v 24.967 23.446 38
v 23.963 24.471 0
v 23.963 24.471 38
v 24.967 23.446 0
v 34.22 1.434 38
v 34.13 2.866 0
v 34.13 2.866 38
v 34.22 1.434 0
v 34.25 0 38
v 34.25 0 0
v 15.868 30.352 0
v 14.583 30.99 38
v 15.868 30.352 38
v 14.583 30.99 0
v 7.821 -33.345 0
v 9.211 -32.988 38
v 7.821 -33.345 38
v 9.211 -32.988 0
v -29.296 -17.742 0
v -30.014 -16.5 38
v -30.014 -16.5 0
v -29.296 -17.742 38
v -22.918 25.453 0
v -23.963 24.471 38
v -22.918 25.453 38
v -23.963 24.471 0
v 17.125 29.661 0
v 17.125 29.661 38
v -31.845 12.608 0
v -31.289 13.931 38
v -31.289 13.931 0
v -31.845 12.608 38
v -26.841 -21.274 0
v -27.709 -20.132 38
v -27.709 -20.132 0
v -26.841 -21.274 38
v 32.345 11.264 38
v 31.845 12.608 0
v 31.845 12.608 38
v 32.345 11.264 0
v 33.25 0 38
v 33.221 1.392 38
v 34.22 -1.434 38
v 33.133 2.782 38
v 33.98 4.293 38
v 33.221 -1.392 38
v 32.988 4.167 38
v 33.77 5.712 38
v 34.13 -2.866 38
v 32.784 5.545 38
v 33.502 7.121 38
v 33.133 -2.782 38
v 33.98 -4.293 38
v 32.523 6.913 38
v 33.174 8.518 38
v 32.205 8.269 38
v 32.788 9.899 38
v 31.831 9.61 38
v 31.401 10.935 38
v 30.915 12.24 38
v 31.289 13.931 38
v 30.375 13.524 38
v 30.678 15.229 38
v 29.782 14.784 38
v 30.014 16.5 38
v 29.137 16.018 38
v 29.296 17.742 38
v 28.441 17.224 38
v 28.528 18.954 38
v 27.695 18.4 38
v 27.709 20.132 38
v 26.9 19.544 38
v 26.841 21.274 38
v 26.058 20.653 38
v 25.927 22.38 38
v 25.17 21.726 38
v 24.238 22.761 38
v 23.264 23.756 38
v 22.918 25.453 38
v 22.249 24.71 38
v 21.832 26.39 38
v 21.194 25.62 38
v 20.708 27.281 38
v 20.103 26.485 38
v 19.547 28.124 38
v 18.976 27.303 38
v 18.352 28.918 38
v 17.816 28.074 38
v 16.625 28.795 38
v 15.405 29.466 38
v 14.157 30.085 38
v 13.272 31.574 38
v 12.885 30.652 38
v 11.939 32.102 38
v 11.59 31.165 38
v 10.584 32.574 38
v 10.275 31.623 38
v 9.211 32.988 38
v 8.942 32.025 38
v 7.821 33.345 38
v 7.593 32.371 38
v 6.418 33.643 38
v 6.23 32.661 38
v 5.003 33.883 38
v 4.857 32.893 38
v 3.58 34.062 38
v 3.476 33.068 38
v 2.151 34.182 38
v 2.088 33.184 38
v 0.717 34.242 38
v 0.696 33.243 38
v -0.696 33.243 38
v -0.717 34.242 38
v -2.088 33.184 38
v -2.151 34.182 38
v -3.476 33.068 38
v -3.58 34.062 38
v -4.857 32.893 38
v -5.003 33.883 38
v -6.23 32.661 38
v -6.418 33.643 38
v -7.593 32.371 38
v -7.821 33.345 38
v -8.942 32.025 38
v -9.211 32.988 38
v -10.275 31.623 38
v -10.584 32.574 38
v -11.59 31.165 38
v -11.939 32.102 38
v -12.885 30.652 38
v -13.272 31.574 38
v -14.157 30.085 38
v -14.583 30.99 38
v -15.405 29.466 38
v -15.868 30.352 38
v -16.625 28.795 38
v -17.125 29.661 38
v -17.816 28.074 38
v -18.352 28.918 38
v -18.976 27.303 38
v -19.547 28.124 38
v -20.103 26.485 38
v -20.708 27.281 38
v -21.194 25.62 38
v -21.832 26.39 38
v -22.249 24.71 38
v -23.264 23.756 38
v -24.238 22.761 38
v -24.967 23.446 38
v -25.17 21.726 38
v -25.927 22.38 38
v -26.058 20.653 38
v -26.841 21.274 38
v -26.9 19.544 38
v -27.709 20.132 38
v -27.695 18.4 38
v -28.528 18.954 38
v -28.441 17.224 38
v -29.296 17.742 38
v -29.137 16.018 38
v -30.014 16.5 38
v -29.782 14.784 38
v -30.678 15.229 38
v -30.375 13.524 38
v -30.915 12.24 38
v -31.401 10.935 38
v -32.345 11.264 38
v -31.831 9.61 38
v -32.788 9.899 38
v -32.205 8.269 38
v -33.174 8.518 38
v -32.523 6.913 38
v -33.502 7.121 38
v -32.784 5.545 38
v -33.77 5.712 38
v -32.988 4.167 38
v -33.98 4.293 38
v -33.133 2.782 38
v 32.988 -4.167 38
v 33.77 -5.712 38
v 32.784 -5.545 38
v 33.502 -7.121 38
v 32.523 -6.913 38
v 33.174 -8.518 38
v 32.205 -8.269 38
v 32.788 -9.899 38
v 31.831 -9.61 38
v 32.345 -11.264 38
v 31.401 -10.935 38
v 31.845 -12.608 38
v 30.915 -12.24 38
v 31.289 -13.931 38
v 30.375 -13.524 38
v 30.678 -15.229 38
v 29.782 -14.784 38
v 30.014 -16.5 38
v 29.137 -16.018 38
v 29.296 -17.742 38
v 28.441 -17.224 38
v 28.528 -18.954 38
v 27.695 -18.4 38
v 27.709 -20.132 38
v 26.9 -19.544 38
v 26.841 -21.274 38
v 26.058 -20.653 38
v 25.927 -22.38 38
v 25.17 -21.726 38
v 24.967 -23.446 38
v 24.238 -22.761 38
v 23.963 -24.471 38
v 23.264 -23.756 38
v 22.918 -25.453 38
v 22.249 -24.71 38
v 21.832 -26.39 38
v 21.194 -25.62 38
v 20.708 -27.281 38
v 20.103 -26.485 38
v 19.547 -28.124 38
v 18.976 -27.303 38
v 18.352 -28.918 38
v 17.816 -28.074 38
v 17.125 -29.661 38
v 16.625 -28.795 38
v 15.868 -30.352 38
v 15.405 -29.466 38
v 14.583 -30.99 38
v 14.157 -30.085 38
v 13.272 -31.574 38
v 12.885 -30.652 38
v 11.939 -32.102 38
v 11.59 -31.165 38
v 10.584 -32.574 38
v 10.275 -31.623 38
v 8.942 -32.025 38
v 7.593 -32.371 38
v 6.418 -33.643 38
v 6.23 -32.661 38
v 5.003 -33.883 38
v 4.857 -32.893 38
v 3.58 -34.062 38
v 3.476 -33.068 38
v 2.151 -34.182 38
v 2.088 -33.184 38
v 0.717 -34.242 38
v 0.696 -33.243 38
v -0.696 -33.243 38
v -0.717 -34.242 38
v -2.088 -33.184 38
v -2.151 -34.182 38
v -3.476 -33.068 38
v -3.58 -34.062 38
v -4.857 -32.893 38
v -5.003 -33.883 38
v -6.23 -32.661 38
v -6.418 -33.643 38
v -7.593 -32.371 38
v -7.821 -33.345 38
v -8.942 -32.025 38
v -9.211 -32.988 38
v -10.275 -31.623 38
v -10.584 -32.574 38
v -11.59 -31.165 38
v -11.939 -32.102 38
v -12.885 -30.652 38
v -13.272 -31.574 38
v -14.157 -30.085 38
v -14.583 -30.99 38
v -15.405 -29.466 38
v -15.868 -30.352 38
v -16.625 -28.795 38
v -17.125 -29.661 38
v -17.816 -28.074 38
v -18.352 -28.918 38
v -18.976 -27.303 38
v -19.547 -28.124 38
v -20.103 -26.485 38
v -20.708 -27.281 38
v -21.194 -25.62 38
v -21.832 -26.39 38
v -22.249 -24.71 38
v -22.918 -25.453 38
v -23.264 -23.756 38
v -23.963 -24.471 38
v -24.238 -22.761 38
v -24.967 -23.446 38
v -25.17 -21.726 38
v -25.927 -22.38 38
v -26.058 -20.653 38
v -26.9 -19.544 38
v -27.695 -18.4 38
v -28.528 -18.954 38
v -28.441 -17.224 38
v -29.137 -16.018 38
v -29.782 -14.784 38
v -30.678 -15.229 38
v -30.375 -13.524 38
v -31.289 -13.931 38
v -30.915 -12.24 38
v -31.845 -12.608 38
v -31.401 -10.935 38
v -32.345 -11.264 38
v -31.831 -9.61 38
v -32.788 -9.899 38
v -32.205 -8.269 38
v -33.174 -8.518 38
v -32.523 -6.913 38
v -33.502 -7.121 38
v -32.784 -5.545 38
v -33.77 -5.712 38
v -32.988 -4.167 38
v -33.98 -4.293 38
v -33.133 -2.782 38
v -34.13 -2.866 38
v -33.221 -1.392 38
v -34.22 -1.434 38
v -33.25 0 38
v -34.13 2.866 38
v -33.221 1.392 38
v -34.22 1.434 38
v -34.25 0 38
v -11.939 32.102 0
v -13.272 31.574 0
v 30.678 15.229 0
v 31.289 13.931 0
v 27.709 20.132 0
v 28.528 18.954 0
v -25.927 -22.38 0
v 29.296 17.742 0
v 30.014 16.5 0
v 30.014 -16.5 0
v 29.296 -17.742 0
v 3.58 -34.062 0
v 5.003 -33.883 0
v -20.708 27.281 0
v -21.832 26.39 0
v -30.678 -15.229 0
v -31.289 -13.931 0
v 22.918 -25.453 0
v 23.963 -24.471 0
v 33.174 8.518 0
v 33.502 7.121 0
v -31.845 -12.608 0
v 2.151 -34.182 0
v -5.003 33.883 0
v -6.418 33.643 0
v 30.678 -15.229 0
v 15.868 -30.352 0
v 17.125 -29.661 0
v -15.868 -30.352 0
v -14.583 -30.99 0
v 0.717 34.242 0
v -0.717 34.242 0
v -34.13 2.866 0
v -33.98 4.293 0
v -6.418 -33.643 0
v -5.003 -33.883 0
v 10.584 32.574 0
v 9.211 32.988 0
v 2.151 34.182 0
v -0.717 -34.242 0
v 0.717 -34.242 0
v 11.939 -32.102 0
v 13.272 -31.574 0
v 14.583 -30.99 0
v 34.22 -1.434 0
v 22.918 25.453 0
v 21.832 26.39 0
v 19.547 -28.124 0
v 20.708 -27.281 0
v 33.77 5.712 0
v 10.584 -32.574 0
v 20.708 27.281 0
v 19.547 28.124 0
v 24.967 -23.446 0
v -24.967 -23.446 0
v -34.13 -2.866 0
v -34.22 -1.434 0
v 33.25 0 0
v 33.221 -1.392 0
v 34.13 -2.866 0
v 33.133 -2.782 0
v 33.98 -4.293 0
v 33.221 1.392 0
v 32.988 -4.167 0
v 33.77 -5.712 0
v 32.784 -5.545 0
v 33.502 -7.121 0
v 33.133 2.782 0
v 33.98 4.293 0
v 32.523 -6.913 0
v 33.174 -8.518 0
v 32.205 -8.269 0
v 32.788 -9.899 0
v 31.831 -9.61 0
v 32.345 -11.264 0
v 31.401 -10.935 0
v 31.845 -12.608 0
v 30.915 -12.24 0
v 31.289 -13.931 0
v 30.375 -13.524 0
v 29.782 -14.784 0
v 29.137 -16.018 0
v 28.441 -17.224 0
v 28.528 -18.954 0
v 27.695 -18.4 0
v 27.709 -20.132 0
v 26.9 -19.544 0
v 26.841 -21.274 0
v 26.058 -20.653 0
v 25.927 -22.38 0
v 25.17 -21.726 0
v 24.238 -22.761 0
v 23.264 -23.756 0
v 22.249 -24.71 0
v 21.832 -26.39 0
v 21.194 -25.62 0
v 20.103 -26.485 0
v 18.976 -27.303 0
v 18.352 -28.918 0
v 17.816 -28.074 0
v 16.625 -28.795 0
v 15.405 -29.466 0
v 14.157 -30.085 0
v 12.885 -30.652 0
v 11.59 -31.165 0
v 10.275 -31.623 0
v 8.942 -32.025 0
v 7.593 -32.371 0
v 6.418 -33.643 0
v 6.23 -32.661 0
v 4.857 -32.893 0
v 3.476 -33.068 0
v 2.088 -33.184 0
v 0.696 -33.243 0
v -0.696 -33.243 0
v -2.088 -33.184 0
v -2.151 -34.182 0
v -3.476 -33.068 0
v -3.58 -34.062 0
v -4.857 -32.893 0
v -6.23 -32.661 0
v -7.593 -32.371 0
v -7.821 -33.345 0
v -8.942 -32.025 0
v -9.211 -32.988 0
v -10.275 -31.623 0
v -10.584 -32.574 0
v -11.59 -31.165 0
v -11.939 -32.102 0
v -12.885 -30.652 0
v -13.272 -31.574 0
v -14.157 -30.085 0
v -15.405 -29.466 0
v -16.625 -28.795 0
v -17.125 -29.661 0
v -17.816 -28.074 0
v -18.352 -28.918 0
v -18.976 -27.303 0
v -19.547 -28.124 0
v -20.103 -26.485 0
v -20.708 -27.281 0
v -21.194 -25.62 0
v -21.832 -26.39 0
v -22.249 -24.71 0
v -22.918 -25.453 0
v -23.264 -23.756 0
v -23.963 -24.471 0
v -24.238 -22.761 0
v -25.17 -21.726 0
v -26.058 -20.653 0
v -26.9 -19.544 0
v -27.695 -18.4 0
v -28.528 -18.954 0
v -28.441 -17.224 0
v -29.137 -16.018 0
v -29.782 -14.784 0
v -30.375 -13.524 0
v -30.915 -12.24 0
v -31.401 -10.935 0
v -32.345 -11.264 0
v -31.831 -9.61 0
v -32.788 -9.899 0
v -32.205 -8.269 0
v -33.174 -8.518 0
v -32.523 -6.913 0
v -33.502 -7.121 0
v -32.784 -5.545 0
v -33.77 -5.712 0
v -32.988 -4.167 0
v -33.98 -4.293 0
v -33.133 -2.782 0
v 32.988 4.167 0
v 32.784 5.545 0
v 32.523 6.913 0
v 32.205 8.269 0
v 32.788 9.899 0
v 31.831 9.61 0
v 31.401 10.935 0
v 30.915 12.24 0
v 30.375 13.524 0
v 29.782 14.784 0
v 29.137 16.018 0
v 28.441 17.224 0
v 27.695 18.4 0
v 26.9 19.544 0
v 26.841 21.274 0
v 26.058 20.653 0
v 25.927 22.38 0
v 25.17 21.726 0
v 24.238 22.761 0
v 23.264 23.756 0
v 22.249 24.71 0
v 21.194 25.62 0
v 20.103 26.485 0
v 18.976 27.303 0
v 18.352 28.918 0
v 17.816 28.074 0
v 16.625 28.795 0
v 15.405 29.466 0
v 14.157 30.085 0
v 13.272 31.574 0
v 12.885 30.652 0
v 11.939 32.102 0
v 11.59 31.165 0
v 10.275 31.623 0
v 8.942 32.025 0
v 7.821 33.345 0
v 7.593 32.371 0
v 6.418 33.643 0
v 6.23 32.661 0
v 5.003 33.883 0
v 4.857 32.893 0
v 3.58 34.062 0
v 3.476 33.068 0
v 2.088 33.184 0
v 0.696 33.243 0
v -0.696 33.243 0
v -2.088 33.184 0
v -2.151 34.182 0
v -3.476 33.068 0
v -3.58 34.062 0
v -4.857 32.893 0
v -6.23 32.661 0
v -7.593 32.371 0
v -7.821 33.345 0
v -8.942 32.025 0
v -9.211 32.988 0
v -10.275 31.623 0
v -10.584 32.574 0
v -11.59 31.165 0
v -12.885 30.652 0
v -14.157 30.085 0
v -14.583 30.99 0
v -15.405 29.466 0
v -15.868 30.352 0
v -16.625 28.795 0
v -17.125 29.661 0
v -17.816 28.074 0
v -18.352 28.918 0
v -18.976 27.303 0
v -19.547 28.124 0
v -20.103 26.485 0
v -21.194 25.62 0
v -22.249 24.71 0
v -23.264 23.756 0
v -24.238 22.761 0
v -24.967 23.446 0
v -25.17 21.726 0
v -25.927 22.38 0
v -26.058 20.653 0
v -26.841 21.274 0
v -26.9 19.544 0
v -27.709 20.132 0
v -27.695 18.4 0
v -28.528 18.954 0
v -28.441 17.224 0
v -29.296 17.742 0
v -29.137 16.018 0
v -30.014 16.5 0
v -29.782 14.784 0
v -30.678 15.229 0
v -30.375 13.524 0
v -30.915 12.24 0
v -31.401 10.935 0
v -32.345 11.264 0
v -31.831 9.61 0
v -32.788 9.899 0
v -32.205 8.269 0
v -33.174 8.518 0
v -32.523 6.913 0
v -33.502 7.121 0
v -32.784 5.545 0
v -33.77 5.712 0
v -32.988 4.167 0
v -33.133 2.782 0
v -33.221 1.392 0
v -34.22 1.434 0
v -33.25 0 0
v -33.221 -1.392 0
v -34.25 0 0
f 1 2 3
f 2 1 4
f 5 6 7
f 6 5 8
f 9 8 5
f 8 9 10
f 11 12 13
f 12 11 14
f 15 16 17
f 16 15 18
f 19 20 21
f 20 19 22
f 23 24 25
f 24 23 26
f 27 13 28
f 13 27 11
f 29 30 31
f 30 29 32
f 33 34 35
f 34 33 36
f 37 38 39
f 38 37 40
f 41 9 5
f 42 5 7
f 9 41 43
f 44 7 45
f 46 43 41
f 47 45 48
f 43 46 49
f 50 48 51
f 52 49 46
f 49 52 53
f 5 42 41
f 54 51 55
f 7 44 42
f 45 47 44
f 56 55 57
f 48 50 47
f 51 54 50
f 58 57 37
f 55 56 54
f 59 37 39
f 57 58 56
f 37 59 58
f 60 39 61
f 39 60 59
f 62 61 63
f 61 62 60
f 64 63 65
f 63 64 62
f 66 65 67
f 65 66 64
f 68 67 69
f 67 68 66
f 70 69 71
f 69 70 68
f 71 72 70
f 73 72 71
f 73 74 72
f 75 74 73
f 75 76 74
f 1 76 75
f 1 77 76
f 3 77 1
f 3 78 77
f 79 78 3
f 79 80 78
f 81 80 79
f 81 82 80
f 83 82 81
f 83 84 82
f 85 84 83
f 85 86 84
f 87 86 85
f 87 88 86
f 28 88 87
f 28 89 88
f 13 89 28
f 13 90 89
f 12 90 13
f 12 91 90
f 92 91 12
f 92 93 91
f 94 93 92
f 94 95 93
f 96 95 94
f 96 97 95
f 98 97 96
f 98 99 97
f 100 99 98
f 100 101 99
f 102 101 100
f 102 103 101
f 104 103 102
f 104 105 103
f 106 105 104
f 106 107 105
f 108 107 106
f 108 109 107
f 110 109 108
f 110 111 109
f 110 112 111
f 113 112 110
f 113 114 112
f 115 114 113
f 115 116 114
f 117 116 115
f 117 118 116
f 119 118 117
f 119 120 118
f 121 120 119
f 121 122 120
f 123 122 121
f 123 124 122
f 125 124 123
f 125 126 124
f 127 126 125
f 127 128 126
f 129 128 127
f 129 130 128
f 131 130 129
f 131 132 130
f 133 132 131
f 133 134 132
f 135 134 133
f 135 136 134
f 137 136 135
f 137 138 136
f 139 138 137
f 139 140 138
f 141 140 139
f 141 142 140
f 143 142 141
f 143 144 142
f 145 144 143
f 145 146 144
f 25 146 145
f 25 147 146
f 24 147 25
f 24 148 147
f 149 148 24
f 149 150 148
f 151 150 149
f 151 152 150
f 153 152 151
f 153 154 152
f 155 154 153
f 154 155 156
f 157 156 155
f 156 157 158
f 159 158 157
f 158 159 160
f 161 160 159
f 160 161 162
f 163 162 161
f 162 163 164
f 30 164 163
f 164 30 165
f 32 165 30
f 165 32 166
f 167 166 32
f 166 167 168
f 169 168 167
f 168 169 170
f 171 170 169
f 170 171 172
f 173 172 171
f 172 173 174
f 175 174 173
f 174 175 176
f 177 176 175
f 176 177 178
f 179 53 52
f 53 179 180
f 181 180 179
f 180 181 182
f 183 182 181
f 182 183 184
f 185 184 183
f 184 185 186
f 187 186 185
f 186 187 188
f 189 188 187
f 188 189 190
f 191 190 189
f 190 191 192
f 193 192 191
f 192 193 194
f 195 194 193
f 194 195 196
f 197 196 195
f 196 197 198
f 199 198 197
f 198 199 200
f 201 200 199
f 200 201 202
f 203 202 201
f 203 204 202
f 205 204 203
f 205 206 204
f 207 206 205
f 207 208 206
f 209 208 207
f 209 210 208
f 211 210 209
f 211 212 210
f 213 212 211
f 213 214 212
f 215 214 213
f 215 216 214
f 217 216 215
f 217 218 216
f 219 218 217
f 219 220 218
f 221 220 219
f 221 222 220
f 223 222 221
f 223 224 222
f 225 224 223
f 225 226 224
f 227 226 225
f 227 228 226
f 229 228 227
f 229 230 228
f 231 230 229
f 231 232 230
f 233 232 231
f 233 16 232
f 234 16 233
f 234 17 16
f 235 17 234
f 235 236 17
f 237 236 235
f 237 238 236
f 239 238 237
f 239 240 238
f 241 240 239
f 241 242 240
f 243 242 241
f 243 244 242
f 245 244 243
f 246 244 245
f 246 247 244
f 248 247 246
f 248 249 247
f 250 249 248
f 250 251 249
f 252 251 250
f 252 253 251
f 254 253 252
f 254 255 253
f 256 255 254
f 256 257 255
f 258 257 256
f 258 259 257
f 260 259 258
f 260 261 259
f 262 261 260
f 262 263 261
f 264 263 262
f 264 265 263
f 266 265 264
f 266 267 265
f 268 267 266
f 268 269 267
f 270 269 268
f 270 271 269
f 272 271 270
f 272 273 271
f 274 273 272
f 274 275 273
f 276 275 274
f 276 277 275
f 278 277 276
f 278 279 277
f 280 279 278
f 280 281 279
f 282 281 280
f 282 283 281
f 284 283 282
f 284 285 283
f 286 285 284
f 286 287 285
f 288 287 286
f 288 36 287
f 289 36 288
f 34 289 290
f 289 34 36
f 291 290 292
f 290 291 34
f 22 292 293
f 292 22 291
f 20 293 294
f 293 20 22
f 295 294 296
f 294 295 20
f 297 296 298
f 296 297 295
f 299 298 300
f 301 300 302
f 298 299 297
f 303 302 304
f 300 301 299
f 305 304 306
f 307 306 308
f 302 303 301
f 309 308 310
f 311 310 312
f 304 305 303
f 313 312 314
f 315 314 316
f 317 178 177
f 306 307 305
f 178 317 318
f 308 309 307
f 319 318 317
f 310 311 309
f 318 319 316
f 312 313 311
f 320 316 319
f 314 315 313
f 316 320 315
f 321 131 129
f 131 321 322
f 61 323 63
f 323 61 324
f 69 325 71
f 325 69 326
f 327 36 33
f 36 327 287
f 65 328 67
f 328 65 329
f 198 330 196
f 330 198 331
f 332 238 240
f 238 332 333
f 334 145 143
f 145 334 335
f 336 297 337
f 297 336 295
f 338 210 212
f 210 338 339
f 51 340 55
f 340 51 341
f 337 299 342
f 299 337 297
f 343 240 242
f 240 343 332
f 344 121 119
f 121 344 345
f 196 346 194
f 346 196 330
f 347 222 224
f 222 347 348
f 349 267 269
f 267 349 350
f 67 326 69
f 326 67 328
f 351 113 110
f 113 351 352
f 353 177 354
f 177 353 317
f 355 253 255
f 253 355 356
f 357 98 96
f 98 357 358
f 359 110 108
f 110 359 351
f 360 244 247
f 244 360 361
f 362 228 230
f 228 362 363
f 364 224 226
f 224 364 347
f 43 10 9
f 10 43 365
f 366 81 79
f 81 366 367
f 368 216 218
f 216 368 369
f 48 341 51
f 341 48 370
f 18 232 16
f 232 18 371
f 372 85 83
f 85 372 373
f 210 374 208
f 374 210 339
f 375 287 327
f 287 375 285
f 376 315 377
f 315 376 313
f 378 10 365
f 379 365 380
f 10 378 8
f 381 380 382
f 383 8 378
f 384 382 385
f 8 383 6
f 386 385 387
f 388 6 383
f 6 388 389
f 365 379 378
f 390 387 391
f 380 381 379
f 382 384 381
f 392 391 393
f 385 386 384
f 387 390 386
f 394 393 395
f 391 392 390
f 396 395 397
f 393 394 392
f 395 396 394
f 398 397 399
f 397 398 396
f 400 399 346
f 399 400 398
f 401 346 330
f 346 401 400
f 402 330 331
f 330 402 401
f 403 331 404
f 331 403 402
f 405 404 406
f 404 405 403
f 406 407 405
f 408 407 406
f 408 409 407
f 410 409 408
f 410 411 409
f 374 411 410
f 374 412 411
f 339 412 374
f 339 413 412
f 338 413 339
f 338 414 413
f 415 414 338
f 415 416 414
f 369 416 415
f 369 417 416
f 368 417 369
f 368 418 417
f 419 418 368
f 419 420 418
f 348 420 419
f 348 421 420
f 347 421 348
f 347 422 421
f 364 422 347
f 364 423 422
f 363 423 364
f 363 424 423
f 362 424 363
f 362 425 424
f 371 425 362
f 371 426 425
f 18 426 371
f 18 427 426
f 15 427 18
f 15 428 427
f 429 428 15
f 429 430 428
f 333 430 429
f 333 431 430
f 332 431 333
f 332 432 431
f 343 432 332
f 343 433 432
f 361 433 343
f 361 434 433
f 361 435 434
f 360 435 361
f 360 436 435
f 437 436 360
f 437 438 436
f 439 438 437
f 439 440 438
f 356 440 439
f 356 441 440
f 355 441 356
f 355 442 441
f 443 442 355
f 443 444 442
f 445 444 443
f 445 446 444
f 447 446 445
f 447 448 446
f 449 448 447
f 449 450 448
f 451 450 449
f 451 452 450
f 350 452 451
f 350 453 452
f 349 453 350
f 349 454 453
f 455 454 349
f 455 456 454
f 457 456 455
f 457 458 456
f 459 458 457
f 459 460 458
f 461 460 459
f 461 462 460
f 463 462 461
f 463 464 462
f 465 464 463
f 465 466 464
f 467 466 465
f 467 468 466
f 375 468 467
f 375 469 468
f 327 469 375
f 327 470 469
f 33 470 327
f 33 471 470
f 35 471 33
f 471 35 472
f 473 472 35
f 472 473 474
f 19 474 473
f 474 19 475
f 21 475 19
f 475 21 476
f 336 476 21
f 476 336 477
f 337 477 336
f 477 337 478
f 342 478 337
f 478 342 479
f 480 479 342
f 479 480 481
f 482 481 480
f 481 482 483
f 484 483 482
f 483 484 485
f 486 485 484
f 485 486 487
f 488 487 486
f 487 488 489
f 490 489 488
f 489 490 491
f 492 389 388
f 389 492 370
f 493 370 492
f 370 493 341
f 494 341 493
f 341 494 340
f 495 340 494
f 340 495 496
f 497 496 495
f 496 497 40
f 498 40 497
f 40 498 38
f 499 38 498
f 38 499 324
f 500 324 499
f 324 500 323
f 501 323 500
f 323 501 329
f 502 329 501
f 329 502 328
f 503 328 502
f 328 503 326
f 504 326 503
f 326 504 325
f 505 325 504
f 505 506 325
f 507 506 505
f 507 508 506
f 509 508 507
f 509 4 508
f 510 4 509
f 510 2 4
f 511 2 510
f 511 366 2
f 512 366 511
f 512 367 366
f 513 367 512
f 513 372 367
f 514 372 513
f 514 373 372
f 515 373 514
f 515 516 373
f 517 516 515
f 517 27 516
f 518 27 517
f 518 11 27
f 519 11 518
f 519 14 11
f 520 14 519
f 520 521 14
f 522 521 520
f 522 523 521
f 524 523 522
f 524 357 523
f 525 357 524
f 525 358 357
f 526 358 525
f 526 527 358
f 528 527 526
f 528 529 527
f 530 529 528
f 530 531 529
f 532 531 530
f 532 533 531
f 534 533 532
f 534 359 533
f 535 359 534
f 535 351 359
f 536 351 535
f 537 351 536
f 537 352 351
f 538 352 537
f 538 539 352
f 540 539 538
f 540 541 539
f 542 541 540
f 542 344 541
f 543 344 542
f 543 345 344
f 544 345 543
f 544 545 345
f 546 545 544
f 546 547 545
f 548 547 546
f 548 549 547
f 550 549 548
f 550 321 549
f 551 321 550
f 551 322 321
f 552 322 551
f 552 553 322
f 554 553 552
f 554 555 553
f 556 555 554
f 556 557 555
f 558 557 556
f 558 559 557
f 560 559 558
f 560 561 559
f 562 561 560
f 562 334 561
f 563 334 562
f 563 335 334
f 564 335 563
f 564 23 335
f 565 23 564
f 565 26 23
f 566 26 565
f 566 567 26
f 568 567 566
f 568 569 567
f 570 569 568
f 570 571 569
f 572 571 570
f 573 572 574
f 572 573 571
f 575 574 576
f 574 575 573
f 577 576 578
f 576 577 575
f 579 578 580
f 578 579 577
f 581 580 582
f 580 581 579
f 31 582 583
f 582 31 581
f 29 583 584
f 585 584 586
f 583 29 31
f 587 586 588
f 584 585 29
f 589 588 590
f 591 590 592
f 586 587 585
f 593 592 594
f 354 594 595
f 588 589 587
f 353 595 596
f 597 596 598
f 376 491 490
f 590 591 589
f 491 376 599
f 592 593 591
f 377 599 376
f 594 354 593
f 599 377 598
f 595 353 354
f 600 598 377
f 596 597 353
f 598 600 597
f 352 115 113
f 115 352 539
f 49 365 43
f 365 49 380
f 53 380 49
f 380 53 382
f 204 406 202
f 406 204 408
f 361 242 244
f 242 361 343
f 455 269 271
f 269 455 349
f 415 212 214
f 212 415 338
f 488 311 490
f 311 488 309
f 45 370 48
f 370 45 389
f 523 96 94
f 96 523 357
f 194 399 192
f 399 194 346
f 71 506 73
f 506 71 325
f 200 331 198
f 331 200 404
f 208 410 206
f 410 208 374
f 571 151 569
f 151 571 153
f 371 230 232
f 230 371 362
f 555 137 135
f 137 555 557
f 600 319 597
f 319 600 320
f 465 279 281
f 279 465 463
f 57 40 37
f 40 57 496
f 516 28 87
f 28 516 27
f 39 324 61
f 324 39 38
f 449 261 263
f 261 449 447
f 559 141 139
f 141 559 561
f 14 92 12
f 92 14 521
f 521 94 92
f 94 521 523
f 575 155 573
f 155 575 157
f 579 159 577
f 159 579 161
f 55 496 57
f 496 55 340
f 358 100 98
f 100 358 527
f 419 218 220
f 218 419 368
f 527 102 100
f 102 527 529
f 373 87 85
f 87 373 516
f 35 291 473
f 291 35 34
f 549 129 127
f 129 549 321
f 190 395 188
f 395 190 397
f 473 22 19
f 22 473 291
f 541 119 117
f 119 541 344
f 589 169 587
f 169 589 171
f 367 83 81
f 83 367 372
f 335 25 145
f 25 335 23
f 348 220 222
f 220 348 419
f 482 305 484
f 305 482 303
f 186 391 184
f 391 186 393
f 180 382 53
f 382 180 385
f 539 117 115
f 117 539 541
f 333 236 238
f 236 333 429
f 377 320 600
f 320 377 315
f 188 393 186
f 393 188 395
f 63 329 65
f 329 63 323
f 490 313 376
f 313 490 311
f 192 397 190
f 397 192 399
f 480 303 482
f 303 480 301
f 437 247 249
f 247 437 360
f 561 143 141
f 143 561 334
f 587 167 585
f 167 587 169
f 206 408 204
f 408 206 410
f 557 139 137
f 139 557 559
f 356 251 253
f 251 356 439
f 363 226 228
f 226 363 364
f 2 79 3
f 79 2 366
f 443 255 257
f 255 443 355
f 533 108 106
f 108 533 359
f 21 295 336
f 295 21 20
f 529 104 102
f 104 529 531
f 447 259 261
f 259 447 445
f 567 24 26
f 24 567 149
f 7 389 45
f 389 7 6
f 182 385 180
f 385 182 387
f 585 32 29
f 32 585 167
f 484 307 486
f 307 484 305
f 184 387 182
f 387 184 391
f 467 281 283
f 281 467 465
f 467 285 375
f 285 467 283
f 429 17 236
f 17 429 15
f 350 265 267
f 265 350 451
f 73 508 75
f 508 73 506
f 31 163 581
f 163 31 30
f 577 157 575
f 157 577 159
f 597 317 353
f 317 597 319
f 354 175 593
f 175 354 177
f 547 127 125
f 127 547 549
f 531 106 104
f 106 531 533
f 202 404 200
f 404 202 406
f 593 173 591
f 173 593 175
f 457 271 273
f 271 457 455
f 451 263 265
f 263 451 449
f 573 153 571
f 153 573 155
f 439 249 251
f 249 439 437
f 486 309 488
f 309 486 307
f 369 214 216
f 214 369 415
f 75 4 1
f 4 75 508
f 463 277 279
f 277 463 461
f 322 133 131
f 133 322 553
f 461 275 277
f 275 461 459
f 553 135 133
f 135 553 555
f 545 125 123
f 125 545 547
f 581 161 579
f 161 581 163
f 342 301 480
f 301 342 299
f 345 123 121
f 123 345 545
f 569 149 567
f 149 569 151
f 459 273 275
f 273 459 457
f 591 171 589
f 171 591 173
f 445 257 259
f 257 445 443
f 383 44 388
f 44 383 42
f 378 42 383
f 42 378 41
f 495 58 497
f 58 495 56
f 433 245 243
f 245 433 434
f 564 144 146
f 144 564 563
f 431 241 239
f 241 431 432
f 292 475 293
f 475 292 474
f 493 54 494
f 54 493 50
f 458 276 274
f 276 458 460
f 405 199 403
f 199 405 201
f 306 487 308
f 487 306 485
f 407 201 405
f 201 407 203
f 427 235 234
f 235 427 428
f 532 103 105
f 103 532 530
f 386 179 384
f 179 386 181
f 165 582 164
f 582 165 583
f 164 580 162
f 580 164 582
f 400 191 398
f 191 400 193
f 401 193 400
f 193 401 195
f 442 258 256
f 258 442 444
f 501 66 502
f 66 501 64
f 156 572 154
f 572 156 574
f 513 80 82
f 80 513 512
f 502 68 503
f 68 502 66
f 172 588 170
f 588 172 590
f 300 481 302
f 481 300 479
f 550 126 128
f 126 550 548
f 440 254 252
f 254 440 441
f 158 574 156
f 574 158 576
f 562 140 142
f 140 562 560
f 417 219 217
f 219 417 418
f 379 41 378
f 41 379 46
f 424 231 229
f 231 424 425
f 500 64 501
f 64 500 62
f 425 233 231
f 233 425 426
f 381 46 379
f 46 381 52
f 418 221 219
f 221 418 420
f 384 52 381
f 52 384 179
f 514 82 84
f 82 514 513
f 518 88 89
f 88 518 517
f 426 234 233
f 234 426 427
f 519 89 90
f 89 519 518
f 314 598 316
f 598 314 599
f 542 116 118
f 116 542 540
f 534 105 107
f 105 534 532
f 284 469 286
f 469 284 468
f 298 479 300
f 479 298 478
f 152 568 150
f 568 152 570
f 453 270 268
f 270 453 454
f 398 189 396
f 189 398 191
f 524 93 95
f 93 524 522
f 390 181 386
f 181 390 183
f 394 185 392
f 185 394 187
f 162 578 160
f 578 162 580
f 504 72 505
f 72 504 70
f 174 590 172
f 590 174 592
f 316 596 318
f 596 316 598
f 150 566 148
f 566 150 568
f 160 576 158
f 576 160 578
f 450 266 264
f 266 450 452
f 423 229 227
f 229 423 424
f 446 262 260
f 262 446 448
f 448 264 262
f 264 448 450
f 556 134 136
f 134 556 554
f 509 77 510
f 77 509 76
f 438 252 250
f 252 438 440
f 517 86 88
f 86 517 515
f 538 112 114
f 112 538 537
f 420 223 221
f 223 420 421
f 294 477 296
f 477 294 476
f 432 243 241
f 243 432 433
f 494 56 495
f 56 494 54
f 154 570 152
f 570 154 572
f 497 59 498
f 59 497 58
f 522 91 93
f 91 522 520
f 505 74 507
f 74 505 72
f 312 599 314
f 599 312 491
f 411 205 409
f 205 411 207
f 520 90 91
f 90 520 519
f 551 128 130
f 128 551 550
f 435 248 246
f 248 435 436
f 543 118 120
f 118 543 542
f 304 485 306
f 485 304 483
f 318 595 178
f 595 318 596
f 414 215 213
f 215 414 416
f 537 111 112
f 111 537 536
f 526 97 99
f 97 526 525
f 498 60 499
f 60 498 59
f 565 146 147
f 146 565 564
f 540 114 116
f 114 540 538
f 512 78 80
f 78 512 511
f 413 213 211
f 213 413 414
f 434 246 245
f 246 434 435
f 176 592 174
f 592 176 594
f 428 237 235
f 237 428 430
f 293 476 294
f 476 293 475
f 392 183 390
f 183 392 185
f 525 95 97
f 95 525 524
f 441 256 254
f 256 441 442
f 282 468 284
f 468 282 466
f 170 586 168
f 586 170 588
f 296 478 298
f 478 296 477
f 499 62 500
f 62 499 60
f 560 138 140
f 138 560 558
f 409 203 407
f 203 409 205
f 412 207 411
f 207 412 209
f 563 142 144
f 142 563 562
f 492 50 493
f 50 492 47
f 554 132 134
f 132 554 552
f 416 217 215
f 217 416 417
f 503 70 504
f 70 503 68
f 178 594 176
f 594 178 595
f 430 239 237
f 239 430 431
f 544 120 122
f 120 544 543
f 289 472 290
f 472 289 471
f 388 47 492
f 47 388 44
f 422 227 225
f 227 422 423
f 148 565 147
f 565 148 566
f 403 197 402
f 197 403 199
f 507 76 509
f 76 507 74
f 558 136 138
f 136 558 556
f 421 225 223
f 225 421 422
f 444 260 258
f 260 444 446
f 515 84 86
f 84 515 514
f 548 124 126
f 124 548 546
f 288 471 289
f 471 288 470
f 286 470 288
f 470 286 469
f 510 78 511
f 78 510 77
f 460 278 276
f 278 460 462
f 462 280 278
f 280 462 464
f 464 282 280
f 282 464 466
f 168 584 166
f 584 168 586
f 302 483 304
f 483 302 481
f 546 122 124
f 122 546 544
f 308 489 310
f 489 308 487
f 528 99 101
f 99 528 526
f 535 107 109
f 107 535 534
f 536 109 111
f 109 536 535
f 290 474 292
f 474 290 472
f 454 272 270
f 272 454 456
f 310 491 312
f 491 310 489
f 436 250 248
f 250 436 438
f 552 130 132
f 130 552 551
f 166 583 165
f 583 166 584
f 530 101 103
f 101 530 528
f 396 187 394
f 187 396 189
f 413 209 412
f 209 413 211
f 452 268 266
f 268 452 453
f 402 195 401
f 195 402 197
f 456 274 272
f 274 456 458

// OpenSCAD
$fn = 150;

difference() {
	cylinder(d = 68.5, h = 38);
	translate(v = [0, 0, -1]) {
		cylinder(d = 66.5, h = 40);
	}
}
